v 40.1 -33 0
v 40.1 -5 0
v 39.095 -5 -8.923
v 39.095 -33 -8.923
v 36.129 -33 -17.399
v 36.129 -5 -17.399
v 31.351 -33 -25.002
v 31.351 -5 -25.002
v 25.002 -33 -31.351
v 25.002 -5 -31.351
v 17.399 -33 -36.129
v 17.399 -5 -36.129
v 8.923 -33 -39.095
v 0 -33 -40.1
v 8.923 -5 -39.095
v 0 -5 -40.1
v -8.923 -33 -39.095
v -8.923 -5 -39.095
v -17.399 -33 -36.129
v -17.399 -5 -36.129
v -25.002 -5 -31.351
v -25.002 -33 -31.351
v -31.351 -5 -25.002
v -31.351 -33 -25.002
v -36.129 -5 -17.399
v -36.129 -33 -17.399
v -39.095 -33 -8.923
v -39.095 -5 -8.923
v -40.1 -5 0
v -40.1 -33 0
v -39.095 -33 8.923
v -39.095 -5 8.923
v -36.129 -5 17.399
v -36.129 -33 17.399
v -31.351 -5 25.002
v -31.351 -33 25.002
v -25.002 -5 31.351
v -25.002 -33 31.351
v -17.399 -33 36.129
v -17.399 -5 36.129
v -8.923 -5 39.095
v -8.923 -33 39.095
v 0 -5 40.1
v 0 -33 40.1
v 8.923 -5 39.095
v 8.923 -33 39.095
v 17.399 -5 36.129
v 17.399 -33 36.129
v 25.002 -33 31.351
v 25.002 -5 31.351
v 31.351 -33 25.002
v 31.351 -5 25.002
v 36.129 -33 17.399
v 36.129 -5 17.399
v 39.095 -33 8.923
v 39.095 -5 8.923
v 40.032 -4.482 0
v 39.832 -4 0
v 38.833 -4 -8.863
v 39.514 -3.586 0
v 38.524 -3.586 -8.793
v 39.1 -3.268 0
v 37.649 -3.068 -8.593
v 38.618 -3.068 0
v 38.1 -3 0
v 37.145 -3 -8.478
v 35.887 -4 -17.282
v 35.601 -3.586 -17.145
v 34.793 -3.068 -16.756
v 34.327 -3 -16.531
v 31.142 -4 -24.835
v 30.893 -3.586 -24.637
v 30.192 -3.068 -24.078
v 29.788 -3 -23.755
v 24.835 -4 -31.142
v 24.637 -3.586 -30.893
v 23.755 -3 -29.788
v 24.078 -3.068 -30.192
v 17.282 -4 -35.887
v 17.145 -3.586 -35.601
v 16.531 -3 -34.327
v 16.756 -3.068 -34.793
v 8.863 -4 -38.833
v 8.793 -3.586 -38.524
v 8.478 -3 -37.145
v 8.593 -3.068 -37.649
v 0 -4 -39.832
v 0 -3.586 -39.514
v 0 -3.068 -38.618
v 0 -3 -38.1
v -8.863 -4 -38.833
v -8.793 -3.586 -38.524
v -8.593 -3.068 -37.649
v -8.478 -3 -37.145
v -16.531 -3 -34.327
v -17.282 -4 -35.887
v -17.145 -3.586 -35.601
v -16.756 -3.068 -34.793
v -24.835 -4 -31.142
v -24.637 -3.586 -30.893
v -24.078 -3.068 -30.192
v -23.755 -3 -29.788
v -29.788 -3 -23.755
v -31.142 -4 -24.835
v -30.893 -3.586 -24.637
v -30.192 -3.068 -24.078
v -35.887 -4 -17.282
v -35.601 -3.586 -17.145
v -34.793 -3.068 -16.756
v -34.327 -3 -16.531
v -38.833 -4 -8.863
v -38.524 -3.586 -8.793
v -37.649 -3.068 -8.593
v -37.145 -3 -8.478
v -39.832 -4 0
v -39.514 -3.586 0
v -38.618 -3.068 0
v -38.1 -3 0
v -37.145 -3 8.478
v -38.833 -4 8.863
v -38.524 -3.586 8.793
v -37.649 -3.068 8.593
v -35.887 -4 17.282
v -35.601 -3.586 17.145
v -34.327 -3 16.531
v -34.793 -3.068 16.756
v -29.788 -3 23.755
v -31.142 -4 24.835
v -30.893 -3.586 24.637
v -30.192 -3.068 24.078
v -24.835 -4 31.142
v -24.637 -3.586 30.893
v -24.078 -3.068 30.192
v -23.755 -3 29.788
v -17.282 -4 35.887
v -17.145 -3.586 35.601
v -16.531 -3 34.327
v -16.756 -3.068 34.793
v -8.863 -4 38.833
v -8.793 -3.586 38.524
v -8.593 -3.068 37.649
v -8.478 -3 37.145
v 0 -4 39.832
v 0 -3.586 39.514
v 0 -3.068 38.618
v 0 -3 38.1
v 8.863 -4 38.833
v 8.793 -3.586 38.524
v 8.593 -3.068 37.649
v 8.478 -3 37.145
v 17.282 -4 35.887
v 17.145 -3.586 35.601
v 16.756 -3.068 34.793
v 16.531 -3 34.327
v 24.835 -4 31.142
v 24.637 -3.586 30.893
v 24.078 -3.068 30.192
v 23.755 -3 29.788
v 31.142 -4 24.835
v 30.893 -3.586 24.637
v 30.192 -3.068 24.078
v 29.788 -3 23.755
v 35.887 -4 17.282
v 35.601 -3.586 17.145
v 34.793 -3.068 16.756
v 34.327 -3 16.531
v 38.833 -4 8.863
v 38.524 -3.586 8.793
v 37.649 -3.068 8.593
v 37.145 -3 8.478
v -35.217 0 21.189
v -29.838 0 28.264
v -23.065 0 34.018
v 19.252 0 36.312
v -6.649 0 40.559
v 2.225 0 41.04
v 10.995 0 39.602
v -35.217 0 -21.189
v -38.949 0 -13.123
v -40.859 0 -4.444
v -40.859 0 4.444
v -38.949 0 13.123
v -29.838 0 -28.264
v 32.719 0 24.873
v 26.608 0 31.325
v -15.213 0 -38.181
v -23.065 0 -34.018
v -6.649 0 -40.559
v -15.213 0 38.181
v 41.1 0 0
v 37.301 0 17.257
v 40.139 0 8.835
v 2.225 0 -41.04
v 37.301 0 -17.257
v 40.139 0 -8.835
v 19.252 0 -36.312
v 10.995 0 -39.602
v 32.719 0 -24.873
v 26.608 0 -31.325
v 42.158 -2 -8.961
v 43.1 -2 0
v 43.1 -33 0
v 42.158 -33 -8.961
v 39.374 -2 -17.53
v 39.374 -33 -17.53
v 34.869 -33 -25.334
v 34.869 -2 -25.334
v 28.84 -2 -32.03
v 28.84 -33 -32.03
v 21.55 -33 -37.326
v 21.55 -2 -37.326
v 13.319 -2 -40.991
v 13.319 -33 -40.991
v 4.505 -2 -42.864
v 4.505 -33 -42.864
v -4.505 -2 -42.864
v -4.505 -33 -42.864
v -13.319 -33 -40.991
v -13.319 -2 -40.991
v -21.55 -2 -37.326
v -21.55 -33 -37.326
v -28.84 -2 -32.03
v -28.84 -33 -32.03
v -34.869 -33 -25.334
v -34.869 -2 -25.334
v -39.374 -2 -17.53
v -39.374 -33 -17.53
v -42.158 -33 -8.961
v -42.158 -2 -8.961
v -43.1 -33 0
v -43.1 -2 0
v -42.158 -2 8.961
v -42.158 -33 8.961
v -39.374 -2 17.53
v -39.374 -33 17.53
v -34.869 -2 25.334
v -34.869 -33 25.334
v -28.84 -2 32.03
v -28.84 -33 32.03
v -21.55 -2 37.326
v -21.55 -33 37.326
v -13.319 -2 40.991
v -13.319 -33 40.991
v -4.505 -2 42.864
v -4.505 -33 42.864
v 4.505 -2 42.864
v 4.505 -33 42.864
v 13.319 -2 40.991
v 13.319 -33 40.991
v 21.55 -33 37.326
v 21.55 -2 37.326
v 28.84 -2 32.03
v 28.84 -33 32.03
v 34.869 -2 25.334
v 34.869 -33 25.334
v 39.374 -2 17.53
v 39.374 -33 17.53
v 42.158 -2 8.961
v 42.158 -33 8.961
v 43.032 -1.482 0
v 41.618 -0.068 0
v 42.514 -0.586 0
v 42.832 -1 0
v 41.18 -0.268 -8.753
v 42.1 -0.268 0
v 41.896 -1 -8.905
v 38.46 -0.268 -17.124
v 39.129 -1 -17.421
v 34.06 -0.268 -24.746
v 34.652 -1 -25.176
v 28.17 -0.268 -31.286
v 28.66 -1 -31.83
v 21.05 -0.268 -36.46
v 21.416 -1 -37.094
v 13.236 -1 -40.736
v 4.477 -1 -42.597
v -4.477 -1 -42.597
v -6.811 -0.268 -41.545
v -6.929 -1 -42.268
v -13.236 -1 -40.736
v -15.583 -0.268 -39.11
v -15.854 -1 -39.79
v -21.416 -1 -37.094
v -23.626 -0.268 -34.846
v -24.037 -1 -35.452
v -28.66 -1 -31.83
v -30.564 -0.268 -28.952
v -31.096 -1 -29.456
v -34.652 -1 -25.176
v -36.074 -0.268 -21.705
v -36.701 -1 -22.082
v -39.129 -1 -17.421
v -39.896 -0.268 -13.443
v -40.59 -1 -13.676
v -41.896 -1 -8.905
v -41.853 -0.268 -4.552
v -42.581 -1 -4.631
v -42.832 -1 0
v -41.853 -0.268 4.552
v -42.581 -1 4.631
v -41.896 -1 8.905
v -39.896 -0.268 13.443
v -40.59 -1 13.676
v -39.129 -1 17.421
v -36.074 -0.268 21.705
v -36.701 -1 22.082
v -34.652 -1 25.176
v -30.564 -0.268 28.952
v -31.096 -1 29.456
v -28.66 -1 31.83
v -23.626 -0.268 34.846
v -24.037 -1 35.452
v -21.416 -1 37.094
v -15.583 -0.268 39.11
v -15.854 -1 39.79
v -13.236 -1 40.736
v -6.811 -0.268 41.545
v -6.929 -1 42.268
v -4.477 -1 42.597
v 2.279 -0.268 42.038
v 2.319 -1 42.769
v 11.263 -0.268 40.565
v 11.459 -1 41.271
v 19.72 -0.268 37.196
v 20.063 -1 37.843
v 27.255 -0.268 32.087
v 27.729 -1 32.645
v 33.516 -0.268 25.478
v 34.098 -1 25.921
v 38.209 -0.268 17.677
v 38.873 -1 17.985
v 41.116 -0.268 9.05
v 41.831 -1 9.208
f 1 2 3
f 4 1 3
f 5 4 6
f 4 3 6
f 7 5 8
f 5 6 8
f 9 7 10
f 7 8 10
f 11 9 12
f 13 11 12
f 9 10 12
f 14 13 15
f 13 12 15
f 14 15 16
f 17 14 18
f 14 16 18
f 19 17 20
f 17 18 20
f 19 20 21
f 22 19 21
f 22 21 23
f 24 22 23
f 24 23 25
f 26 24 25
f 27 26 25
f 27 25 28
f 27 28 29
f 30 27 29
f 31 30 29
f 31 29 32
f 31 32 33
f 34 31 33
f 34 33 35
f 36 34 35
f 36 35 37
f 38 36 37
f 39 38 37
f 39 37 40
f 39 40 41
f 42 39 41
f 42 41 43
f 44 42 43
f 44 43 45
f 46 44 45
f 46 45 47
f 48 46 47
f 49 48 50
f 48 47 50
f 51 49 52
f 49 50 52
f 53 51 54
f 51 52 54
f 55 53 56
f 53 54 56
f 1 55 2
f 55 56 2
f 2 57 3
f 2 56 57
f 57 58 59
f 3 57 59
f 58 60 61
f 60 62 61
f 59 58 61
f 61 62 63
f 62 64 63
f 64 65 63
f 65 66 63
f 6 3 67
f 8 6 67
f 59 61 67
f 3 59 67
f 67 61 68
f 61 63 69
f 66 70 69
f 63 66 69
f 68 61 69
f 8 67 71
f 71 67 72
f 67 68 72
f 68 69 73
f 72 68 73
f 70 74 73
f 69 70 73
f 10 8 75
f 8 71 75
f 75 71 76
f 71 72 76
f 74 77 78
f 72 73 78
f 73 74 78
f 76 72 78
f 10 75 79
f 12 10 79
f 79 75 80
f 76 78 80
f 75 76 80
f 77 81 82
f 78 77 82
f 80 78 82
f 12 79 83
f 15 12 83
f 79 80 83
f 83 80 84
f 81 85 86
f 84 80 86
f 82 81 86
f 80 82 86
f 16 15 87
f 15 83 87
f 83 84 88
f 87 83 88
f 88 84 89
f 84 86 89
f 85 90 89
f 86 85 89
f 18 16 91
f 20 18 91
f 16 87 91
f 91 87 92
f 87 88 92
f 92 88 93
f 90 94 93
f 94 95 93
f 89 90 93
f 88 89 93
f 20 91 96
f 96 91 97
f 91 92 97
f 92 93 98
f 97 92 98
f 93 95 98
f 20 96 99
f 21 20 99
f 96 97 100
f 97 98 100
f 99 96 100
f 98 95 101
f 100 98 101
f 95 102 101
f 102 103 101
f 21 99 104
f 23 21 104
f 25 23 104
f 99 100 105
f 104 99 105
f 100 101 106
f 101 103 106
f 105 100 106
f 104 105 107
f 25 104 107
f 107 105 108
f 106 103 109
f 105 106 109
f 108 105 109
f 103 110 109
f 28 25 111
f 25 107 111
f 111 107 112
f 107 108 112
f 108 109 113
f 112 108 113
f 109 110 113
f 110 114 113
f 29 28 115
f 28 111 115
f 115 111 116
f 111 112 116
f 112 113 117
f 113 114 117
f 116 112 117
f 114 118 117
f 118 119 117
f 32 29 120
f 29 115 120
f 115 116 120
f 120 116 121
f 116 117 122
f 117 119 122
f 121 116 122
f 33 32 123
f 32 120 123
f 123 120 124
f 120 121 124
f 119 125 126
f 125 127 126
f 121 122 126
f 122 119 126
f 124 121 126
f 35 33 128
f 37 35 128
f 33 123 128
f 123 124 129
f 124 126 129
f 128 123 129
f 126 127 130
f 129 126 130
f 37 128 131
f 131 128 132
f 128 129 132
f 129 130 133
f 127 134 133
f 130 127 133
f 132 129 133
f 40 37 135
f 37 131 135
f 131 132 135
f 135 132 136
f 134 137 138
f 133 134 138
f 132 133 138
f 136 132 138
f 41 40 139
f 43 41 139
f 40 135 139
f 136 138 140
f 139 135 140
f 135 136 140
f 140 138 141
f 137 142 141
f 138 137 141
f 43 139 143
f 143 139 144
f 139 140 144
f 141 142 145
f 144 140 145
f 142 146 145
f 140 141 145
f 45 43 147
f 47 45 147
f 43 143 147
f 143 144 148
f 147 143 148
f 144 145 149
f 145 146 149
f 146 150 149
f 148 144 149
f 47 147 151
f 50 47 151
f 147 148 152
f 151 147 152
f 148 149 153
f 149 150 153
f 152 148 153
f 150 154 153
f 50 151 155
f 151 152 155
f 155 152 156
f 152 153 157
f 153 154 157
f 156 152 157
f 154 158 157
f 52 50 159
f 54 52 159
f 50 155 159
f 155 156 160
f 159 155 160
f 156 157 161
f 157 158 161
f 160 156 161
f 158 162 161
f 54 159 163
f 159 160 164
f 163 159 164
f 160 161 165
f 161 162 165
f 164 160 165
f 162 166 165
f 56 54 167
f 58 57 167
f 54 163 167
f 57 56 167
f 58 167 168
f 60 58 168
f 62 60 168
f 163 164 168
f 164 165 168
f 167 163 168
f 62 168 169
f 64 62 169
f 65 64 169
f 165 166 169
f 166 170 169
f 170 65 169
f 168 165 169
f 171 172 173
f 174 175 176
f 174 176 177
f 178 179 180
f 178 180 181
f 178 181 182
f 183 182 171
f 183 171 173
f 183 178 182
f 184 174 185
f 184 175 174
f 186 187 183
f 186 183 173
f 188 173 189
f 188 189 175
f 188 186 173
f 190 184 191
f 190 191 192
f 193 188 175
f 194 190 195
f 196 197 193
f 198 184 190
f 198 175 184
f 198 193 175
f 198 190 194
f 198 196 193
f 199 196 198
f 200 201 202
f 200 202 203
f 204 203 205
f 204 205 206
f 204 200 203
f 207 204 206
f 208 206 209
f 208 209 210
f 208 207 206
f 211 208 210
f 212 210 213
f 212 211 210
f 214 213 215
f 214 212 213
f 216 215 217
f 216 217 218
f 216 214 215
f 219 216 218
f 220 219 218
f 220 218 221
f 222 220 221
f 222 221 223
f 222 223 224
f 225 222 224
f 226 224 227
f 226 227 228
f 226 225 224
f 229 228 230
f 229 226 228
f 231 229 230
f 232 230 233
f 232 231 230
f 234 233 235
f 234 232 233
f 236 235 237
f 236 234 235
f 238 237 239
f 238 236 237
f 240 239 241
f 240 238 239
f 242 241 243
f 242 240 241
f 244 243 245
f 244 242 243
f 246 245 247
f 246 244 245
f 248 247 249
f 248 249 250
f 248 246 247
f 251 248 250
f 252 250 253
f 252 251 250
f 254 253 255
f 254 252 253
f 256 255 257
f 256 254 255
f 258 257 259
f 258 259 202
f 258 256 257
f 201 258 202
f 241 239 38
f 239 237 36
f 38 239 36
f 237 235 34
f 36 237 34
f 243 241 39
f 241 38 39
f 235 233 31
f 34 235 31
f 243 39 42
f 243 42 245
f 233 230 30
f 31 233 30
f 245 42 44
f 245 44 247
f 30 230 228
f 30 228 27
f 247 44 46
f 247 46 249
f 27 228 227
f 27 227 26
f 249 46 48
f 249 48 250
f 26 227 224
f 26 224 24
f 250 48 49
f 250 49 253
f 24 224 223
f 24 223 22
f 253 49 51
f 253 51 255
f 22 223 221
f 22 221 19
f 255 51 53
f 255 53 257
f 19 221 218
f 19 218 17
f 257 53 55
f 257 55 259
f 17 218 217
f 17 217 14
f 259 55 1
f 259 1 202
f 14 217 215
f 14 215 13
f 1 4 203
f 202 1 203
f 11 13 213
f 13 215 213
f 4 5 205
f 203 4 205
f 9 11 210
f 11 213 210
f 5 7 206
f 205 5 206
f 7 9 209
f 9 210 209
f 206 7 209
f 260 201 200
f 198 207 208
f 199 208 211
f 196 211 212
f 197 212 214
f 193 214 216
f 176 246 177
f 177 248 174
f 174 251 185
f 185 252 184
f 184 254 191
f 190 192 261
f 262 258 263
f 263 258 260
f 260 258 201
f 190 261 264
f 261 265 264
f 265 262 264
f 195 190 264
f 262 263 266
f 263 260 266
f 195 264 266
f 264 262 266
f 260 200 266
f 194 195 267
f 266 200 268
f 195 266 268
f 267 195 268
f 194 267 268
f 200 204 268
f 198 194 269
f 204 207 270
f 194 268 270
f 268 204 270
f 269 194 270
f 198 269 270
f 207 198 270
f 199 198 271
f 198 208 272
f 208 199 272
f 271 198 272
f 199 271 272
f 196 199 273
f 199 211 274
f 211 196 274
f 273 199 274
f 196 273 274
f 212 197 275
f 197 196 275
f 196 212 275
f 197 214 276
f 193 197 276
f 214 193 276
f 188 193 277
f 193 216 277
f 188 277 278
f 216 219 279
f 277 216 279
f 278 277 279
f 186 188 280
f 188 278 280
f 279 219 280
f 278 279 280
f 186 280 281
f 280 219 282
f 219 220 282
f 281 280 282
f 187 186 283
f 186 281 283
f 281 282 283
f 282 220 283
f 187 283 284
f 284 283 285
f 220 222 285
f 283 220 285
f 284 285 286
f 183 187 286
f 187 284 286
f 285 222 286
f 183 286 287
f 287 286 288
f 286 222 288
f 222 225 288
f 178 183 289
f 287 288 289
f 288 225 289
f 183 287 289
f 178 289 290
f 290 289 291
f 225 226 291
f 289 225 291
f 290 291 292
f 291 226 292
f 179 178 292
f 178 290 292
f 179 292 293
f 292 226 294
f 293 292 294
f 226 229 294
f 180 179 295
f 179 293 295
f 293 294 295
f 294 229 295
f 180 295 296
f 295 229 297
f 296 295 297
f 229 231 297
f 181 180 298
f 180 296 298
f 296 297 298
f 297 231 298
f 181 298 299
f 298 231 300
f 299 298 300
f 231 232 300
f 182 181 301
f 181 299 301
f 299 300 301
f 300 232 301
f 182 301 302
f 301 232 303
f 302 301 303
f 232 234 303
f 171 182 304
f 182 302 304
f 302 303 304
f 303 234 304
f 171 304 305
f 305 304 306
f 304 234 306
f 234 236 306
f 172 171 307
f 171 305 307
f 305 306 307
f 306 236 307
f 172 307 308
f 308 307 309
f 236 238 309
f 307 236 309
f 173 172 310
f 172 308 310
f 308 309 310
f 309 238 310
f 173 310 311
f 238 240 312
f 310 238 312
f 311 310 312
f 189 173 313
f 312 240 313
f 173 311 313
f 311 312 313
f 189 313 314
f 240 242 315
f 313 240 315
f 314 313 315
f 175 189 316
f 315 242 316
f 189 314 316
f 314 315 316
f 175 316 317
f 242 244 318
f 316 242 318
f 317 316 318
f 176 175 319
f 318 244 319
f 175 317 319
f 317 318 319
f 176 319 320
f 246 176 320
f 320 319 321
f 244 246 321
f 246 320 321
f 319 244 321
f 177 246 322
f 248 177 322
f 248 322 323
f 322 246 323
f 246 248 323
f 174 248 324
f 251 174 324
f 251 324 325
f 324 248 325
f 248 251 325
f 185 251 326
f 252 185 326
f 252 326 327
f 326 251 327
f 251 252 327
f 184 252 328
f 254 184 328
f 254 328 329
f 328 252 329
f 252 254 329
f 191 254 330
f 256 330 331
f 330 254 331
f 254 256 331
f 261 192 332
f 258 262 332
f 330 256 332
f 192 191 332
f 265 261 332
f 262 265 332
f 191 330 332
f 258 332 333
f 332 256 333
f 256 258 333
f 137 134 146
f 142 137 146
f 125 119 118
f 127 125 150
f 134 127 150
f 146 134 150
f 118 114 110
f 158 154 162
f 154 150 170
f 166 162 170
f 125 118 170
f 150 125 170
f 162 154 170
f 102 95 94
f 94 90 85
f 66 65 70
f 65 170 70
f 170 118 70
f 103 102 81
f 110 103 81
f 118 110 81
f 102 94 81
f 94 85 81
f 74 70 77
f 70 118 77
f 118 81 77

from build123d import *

# Parameters (mm, degrees)
SKETCH1_R           = 43.1
SKETCH1_R_2         = 40.1
BOSS_EXTRUDE1_DEPTH = 33
SKETCH1_2_R         = 40.1
BOSS_EXTRUDE2_DEPTH = 3
FILLET1_R           = 2


with BuildPart() as part:
    # Sketch1 → Boss-Extrude1 (new body)
    with BuildSketch(Plane(origin=(0, 0, 0), x_dir=(1, 0, 0), z_dir=(0, 1, 0))):
        Circle(SKETCH1_R)
        Circle(SKETCH1_R_2, mode=Mode.SUBTRACT)
    extrude(amount=-BOSS_EXTRUDE1_DEPTH)

    # Sketch1<2> → Boss-Extrude2 (add)
    with BuildSketch(Plane(origin=(0, 0, 0), x_dir=(1, 0, 0), z_dir=(0, 1, 0))):
        Circle(SKETCH1_2_R)
    extrude(amount=-BOSS_EXTRUDE2_DEPTH)

    # Fillet1
    fillet1_edges = [part.edges().sort_by_distance(p)[0] for p in [
        (-43.1, 0, 0),
        (-40.1, -3, 0),
    ]]
    fillet(fillet1_edges, radius=FILLET1_R)


solid = part.part
